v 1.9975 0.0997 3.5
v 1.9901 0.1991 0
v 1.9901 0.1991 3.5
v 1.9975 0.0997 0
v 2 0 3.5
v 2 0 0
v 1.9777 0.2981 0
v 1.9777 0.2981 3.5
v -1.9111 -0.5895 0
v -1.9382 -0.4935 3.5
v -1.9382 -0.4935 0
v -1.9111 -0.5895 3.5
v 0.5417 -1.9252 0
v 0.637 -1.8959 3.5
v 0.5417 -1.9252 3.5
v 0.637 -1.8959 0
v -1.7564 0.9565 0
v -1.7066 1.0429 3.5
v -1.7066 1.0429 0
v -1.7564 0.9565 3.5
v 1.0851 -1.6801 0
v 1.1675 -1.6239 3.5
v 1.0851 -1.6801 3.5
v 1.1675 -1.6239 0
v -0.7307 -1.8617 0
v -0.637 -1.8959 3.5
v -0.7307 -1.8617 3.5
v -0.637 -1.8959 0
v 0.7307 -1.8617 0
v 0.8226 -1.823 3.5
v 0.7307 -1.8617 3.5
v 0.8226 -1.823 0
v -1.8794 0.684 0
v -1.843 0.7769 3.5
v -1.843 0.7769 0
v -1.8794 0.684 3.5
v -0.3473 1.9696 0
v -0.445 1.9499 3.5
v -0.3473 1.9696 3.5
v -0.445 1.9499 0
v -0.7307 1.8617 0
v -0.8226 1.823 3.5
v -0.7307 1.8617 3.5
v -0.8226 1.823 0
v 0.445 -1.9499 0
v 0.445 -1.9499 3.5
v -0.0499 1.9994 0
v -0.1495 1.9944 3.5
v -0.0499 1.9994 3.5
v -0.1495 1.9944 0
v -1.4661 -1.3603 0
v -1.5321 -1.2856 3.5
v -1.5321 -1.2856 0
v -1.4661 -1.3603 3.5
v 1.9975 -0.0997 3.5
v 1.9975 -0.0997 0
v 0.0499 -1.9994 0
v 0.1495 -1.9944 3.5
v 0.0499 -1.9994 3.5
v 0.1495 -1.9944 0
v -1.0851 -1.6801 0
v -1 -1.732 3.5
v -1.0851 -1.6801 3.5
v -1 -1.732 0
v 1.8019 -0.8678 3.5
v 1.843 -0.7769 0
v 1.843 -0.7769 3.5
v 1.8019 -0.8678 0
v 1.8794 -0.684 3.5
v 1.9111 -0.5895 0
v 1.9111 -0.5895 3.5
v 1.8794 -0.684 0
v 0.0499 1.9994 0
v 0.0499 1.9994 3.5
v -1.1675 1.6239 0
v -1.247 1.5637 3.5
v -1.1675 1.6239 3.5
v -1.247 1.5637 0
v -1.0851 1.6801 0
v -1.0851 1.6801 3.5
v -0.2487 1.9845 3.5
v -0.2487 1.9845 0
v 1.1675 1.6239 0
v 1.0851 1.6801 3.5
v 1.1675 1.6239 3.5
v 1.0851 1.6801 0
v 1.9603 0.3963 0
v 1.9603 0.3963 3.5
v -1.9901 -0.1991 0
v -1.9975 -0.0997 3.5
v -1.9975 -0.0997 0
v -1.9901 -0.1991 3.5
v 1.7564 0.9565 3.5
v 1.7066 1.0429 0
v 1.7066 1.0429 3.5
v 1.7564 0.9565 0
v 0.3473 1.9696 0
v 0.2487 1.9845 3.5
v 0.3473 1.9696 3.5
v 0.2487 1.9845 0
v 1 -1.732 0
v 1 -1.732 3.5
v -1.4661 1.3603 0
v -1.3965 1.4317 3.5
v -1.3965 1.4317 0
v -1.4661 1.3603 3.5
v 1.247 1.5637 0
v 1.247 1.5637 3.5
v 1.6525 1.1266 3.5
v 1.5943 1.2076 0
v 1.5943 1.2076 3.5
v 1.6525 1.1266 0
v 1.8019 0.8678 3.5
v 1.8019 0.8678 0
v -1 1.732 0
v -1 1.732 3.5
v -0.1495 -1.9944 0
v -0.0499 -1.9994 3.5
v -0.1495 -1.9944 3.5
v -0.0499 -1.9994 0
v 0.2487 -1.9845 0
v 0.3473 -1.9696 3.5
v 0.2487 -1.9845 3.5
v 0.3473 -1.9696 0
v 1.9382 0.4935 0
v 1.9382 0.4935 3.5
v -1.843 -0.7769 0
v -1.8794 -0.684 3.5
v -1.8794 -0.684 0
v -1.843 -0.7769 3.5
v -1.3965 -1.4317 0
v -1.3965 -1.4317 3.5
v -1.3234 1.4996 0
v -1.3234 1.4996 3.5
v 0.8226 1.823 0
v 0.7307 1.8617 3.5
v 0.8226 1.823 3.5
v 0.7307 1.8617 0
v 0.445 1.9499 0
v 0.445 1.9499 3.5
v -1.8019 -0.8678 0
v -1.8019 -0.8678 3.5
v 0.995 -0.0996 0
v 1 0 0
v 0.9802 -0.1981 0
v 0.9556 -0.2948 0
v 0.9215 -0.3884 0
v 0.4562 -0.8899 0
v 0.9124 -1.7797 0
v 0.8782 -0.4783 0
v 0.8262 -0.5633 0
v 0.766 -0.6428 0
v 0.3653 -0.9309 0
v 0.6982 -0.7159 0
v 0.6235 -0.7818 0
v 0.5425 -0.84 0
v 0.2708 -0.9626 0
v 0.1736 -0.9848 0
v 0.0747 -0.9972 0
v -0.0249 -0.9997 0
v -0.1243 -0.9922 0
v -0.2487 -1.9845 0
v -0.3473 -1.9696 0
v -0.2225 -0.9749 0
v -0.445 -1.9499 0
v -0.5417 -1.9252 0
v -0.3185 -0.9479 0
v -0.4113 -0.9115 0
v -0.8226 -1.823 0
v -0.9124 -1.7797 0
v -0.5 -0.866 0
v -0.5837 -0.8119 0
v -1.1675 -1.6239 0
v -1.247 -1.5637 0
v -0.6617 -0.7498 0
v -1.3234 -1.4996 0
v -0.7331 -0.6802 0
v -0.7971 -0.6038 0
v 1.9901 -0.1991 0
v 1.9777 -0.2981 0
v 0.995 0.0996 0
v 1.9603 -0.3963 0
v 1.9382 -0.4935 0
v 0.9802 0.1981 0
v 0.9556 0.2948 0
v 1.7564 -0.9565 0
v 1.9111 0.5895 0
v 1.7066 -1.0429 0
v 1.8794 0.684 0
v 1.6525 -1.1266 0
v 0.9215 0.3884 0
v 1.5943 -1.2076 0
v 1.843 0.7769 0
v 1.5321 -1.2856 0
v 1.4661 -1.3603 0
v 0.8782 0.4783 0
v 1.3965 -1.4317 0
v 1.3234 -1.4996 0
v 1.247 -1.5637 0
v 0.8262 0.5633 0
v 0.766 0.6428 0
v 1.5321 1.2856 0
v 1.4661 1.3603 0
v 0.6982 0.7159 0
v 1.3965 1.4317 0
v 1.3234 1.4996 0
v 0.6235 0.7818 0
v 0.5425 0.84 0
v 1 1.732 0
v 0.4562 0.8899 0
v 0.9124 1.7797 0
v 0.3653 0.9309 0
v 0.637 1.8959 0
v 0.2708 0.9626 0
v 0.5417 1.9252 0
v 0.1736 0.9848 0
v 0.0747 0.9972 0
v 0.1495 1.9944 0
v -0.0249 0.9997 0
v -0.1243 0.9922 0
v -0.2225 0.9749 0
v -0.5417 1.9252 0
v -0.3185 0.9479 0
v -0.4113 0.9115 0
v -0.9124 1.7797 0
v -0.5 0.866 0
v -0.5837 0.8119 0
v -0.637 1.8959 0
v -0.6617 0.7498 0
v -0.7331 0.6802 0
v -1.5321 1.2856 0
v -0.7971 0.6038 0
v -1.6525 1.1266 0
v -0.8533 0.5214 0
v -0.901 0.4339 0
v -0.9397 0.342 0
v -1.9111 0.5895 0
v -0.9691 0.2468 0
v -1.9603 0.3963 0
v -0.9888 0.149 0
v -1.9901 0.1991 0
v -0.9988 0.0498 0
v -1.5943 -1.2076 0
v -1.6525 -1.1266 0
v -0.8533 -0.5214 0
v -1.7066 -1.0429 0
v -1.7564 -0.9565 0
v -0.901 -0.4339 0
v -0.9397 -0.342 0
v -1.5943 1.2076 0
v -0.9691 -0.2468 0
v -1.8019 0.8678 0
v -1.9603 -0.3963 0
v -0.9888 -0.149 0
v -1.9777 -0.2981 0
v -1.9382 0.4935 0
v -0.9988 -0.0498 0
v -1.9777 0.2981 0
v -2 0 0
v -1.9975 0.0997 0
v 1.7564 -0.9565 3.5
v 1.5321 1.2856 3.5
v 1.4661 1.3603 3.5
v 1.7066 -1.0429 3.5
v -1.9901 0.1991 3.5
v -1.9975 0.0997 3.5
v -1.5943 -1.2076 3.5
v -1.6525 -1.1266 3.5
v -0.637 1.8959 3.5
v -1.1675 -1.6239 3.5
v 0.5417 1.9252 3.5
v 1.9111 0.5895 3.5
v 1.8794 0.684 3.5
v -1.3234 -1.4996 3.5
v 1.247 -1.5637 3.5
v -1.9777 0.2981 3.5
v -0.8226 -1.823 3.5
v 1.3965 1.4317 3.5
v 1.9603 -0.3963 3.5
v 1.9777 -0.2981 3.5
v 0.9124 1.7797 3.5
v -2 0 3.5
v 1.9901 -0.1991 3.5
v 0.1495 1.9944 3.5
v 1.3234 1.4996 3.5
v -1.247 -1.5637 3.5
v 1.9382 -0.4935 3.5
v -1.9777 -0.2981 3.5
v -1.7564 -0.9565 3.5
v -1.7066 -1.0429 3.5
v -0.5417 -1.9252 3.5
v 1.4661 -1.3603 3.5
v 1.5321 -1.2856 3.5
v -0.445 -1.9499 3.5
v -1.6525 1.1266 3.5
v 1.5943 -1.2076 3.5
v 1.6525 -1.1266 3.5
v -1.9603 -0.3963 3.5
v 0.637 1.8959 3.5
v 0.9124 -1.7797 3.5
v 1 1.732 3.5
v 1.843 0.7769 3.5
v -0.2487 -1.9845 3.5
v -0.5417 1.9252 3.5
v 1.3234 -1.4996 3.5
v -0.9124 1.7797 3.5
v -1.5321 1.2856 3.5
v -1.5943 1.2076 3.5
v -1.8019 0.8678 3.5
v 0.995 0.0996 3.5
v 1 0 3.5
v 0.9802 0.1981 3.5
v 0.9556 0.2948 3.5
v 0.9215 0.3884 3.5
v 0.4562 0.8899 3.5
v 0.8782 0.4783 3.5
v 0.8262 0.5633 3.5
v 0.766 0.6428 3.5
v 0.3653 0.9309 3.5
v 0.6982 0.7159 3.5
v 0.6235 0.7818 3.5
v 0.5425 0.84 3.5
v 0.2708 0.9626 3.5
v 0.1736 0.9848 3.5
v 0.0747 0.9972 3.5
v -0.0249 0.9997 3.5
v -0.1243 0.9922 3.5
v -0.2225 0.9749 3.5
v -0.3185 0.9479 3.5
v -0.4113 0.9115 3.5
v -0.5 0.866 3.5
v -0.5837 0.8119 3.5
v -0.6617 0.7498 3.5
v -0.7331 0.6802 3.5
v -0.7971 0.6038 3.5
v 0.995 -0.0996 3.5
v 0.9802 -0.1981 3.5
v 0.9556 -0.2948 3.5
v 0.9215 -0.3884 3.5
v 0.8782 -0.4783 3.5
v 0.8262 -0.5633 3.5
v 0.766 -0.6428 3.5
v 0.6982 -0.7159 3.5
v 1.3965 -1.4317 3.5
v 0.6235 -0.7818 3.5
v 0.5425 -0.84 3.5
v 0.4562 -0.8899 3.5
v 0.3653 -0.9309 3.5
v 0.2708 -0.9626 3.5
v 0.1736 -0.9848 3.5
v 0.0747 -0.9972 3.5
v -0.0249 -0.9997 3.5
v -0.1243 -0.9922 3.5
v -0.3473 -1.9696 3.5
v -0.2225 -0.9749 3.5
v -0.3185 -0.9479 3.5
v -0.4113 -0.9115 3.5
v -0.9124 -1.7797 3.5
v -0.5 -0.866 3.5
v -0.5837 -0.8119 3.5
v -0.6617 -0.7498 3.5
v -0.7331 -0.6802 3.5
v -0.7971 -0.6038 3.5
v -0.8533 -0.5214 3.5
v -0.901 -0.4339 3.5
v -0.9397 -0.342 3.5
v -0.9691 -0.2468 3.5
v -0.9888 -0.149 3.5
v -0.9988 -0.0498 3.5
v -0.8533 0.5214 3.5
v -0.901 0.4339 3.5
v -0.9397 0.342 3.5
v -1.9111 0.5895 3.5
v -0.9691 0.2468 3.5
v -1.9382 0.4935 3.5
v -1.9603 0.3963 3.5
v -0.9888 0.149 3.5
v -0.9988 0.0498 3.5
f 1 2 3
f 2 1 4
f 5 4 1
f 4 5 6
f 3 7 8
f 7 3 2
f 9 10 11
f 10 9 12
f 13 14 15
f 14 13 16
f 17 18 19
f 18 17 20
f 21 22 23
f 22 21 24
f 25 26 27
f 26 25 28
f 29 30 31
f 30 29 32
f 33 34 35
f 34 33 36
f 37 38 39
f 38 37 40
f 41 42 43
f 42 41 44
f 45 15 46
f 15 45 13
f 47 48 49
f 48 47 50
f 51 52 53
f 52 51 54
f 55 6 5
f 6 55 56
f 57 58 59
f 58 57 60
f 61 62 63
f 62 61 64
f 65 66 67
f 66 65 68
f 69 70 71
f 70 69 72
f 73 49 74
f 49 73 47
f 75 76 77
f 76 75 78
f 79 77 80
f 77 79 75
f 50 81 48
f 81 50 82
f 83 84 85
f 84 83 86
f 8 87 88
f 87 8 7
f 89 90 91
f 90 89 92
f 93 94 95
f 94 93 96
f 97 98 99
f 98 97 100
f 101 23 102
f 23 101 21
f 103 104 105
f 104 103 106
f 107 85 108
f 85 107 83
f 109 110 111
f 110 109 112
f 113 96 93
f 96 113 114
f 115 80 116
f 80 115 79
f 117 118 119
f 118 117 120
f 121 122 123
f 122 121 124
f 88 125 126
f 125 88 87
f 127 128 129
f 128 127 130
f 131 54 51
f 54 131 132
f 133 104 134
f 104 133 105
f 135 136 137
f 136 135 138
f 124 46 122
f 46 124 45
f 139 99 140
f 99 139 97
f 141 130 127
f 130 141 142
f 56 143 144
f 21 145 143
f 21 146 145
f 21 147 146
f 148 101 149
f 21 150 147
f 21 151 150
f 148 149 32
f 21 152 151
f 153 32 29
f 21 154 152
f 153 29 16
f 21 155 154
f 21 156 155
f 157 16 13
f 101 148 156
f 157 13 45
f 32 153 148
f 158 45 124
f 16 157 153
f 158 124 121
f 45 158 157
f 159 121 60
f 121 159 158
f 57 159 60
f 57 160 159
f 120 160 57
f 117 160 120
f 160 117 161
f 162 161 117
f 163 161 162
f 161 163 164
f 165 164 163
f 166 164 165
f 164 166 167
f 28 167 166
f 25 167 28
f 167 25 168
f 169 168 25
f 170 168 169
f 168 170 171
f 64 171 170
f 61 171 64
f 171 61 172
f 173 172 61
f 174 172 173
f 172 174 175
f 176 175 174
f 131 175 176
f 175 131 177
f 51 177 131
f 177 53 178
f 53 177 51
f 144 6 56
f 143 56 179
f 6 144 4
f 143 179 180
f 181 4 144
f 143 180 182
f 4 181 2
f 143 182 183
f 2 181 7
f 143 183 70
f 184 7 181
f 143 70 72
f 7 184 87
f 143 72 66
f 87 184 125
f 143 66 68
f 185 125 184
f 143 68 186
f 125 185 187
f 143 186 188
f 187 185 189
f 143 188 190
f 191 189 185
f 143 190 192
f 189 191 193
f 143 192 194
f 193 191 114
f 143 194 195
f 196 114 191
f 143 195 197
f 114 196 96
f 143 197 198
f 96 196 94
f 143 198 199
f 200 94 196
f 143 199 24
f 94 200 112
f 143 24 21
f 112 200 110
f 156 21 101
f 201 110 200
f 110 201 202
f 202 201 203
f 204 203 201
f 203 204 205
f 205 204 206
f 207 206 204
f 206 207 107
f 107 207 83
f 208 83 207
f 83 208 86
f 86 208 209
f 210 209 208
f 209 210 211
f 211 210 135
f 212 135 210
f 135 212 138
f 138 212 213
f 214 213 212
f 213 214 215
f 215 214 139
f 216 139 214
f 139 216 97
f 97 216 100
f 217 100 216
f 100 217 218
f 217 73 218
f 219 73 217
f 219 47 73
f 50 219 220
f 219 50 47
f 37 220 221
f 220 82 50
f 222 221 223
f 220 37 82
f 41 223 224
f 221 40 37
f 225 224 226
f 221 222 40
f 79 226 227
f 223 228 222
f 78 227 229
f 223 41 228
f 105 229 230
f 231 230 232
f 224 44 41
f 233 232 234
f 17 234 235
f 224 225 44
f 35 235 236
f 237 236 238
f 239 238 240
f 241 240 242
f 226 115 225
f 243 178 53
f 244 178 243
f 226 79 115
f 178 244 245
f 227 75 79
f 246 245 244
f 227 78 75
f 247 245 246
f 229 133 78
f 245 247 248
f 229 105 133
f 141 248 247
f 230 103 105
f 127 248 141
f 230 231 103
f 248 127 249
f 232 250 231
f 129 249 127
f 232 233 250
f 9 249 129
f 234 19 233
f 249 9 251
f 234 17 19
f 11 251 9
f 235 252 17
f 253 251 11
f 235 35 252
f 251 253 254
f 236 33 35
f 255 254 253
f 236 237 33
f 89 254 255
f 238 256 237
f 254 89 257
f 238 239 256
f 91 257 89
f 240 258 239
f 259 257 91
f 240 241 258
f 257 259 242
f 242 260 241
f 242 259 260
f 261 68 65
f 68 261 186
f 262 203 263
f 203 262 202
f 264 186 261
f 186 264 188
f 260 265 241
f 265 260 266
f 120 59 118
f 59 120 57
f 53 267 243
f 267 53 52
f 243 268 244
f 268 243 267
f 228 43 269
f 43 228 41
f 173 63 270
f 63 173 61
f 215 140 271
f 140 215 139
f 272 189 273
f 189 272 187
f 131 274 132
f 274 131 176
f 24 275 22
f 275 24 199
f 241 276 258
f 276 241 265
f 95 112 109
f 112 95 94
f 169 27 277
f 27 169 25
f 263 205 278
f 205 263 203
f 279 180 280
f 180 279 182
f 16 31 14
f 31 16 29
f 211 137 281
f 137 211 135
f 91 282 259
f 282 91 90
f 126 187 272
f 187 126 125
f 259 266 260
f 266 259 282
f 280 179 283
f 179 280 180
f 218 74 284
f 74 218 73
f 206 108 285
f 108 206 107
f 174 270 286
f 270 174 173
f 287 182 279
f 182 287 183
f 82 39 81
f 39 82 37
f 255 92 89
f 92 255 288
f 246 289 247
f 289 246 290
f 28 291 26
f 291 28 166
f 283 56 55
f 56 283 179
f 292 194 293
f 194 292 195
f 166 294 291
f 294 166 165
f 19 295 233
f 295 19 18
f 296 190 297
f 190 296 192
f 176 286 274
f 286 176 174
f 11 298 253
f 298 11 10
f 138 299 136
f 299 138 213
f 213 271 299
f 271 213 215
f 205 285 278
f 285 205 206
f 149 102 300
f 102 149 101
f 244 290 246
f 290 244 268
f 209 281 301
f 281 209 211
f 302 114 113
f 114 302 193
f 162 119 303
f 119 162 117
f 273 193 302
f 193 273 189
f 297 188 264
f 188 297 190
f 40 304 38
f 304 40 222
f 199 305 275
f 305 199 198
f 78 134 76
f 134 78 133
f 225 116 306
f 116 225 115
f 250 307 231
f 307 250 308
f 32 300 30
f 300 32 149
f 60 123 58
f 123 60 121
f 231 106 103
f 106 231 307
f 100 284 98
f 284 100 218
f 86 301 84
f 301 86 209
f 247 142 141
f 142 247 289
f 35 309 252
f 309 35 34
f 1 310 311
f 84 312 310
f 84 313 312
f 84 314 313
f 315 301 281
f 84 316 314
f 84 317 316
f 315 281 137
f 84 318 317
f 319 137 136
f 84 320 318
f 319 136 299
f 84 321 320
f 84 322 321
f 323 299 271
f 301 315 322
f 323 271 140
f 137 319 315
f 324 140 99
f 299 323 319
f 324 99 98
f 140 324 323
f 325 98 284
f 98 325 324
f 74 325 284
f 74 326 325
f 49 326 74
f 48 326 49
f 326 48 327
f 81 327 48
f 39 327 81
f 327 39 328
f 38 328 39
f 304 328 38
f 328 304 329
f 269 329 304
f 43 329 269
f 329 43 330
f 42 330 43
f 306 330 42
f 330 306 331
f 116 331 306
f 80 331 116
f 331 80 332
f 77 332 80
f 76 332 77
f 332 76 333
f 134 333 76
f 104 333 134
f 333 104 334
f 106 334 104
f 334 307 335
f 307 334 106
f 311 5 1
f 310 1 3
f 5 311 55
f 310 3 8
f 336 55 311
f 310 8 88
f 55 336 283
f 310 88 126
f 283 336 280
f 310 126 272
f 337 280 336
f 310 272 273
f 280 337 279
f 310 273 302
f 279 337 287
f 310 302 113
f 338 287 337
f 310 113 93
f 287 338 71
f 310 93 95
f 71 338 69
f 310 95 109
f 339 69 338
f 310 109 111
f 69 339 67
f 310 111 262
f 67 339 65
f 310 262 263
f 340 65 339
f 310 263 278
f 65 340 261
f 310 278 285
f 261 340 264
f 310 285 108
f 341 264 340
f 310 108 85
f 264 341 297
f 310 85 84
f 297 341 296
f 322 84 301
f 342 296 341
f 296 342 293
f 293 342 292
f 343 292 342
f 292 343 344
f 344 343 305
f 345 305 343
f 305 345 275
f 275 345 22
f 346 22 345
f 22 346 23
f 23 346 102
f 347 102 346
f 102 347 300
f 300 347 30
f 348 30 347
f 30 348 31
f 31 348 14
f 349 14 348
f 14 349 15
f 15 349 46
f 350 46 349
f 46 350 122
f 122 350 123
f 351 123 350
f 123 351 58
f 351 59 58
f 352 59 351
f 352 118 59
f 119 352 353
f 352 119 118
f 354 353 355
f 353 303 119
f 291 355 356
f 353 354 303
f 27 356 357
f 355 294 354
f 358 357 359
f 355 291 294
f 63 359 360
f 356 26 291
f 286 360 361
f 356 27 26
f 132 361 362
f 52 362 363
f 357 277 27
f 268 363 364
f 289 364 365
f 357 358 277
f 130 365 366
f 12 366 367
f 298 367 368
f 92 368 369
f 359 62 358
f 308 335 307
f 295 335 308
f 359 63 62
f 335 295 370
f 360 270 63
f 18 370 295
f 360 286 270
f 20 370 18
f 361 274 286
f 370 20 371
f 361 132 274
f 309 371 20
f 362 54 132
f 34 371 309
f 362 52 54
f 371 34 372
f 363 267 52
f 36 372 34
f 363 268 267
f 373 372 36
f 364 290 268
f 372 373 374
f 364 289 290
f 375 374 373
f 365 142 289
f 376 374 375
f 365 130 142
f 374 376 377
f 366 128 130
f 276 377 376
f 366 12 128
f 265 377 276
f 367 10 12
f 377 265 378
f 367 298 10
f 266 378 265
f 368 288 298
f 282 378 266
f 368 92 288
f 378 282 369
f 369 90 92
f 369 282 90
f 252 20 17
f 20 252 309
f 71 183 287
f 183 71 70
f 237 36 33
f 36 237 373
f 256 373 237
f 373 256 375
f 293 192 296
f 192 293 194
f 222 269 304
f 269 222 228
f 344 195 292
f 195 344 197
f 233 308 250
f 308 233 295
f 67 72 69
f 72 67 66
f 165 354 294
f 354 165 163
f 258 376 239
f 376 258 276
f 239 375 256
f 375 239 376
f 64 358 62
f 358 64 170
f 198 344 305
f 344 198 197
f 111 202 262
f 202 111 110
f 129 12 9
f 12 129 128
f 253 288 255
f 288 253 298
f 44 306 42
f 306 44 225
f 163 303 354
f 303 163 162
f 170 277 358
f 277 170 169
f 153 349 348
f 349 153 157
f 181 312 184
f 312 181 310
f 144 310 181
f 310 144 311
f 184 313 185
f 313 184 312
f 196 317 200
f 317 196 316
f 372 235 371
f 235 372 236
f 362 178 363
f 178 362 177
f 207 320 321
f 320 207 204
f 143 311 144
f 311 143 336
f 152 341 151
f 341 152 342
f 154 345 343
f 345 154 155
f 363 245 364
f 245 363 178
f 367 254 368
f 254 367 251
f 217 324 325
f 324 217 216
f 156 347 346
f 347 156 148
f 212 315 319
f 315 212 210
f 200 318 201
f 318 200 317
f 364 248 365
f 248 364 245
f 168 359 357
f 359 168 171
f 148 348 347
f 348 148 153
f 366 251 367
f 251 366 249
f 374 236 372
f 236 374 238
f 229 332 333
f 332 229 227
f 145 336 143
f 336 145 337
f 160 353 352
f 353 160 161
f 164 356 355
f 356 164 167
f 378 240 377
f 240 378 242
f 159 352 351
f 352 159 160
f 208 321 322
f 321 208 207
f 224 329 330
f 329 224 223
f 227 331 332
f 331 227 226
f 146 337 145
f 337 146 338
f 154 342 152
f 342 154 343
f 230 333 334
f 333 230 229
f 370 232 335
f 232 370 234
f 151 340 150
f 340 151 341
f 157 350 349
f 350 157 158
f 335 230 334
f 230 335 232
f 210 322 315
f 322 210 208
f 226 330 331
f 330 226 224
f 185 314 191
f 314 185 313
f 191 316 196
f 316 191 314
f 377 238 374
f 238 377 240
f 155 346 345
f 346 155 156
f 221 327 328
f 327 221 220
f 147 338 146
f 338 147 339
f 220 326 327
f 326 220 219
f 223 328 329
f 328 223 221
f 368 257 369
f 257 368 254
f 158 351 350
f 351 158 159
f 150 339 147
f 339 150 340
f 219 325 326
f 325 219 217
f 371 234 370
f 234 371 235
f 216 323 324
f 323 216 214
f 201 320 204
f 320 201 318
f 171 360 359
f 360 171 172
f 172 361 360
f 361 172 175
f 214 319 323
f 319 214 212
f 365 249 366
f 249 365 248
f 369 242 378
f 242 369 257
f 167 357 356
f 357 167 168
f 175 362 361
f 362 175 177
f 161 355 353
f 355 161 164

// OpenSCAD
$fs = $preview ? 1 : 0.1;
$fa = $preview ? 3 : 0.1;

module screw(d, l) {
    union() {
        cylinder(l, d/2, d/2);
        
        translate([0, 0, l])
        difference() {
            cylinder(2, 2, 2);
            
            translate([0, 0, 2])
            cube([6, 1, 1.1], center = true);
        }
    }
}

module standoff(di, do, l) {
    difference() {
        cylinder(l, do/2, do/2);
        
        translate([0, 0, -0.5])
        cylinder(l+1, di/2, di/2);
    }
}

//screw(2, 8);
standoff(2, 4, 3.5);
